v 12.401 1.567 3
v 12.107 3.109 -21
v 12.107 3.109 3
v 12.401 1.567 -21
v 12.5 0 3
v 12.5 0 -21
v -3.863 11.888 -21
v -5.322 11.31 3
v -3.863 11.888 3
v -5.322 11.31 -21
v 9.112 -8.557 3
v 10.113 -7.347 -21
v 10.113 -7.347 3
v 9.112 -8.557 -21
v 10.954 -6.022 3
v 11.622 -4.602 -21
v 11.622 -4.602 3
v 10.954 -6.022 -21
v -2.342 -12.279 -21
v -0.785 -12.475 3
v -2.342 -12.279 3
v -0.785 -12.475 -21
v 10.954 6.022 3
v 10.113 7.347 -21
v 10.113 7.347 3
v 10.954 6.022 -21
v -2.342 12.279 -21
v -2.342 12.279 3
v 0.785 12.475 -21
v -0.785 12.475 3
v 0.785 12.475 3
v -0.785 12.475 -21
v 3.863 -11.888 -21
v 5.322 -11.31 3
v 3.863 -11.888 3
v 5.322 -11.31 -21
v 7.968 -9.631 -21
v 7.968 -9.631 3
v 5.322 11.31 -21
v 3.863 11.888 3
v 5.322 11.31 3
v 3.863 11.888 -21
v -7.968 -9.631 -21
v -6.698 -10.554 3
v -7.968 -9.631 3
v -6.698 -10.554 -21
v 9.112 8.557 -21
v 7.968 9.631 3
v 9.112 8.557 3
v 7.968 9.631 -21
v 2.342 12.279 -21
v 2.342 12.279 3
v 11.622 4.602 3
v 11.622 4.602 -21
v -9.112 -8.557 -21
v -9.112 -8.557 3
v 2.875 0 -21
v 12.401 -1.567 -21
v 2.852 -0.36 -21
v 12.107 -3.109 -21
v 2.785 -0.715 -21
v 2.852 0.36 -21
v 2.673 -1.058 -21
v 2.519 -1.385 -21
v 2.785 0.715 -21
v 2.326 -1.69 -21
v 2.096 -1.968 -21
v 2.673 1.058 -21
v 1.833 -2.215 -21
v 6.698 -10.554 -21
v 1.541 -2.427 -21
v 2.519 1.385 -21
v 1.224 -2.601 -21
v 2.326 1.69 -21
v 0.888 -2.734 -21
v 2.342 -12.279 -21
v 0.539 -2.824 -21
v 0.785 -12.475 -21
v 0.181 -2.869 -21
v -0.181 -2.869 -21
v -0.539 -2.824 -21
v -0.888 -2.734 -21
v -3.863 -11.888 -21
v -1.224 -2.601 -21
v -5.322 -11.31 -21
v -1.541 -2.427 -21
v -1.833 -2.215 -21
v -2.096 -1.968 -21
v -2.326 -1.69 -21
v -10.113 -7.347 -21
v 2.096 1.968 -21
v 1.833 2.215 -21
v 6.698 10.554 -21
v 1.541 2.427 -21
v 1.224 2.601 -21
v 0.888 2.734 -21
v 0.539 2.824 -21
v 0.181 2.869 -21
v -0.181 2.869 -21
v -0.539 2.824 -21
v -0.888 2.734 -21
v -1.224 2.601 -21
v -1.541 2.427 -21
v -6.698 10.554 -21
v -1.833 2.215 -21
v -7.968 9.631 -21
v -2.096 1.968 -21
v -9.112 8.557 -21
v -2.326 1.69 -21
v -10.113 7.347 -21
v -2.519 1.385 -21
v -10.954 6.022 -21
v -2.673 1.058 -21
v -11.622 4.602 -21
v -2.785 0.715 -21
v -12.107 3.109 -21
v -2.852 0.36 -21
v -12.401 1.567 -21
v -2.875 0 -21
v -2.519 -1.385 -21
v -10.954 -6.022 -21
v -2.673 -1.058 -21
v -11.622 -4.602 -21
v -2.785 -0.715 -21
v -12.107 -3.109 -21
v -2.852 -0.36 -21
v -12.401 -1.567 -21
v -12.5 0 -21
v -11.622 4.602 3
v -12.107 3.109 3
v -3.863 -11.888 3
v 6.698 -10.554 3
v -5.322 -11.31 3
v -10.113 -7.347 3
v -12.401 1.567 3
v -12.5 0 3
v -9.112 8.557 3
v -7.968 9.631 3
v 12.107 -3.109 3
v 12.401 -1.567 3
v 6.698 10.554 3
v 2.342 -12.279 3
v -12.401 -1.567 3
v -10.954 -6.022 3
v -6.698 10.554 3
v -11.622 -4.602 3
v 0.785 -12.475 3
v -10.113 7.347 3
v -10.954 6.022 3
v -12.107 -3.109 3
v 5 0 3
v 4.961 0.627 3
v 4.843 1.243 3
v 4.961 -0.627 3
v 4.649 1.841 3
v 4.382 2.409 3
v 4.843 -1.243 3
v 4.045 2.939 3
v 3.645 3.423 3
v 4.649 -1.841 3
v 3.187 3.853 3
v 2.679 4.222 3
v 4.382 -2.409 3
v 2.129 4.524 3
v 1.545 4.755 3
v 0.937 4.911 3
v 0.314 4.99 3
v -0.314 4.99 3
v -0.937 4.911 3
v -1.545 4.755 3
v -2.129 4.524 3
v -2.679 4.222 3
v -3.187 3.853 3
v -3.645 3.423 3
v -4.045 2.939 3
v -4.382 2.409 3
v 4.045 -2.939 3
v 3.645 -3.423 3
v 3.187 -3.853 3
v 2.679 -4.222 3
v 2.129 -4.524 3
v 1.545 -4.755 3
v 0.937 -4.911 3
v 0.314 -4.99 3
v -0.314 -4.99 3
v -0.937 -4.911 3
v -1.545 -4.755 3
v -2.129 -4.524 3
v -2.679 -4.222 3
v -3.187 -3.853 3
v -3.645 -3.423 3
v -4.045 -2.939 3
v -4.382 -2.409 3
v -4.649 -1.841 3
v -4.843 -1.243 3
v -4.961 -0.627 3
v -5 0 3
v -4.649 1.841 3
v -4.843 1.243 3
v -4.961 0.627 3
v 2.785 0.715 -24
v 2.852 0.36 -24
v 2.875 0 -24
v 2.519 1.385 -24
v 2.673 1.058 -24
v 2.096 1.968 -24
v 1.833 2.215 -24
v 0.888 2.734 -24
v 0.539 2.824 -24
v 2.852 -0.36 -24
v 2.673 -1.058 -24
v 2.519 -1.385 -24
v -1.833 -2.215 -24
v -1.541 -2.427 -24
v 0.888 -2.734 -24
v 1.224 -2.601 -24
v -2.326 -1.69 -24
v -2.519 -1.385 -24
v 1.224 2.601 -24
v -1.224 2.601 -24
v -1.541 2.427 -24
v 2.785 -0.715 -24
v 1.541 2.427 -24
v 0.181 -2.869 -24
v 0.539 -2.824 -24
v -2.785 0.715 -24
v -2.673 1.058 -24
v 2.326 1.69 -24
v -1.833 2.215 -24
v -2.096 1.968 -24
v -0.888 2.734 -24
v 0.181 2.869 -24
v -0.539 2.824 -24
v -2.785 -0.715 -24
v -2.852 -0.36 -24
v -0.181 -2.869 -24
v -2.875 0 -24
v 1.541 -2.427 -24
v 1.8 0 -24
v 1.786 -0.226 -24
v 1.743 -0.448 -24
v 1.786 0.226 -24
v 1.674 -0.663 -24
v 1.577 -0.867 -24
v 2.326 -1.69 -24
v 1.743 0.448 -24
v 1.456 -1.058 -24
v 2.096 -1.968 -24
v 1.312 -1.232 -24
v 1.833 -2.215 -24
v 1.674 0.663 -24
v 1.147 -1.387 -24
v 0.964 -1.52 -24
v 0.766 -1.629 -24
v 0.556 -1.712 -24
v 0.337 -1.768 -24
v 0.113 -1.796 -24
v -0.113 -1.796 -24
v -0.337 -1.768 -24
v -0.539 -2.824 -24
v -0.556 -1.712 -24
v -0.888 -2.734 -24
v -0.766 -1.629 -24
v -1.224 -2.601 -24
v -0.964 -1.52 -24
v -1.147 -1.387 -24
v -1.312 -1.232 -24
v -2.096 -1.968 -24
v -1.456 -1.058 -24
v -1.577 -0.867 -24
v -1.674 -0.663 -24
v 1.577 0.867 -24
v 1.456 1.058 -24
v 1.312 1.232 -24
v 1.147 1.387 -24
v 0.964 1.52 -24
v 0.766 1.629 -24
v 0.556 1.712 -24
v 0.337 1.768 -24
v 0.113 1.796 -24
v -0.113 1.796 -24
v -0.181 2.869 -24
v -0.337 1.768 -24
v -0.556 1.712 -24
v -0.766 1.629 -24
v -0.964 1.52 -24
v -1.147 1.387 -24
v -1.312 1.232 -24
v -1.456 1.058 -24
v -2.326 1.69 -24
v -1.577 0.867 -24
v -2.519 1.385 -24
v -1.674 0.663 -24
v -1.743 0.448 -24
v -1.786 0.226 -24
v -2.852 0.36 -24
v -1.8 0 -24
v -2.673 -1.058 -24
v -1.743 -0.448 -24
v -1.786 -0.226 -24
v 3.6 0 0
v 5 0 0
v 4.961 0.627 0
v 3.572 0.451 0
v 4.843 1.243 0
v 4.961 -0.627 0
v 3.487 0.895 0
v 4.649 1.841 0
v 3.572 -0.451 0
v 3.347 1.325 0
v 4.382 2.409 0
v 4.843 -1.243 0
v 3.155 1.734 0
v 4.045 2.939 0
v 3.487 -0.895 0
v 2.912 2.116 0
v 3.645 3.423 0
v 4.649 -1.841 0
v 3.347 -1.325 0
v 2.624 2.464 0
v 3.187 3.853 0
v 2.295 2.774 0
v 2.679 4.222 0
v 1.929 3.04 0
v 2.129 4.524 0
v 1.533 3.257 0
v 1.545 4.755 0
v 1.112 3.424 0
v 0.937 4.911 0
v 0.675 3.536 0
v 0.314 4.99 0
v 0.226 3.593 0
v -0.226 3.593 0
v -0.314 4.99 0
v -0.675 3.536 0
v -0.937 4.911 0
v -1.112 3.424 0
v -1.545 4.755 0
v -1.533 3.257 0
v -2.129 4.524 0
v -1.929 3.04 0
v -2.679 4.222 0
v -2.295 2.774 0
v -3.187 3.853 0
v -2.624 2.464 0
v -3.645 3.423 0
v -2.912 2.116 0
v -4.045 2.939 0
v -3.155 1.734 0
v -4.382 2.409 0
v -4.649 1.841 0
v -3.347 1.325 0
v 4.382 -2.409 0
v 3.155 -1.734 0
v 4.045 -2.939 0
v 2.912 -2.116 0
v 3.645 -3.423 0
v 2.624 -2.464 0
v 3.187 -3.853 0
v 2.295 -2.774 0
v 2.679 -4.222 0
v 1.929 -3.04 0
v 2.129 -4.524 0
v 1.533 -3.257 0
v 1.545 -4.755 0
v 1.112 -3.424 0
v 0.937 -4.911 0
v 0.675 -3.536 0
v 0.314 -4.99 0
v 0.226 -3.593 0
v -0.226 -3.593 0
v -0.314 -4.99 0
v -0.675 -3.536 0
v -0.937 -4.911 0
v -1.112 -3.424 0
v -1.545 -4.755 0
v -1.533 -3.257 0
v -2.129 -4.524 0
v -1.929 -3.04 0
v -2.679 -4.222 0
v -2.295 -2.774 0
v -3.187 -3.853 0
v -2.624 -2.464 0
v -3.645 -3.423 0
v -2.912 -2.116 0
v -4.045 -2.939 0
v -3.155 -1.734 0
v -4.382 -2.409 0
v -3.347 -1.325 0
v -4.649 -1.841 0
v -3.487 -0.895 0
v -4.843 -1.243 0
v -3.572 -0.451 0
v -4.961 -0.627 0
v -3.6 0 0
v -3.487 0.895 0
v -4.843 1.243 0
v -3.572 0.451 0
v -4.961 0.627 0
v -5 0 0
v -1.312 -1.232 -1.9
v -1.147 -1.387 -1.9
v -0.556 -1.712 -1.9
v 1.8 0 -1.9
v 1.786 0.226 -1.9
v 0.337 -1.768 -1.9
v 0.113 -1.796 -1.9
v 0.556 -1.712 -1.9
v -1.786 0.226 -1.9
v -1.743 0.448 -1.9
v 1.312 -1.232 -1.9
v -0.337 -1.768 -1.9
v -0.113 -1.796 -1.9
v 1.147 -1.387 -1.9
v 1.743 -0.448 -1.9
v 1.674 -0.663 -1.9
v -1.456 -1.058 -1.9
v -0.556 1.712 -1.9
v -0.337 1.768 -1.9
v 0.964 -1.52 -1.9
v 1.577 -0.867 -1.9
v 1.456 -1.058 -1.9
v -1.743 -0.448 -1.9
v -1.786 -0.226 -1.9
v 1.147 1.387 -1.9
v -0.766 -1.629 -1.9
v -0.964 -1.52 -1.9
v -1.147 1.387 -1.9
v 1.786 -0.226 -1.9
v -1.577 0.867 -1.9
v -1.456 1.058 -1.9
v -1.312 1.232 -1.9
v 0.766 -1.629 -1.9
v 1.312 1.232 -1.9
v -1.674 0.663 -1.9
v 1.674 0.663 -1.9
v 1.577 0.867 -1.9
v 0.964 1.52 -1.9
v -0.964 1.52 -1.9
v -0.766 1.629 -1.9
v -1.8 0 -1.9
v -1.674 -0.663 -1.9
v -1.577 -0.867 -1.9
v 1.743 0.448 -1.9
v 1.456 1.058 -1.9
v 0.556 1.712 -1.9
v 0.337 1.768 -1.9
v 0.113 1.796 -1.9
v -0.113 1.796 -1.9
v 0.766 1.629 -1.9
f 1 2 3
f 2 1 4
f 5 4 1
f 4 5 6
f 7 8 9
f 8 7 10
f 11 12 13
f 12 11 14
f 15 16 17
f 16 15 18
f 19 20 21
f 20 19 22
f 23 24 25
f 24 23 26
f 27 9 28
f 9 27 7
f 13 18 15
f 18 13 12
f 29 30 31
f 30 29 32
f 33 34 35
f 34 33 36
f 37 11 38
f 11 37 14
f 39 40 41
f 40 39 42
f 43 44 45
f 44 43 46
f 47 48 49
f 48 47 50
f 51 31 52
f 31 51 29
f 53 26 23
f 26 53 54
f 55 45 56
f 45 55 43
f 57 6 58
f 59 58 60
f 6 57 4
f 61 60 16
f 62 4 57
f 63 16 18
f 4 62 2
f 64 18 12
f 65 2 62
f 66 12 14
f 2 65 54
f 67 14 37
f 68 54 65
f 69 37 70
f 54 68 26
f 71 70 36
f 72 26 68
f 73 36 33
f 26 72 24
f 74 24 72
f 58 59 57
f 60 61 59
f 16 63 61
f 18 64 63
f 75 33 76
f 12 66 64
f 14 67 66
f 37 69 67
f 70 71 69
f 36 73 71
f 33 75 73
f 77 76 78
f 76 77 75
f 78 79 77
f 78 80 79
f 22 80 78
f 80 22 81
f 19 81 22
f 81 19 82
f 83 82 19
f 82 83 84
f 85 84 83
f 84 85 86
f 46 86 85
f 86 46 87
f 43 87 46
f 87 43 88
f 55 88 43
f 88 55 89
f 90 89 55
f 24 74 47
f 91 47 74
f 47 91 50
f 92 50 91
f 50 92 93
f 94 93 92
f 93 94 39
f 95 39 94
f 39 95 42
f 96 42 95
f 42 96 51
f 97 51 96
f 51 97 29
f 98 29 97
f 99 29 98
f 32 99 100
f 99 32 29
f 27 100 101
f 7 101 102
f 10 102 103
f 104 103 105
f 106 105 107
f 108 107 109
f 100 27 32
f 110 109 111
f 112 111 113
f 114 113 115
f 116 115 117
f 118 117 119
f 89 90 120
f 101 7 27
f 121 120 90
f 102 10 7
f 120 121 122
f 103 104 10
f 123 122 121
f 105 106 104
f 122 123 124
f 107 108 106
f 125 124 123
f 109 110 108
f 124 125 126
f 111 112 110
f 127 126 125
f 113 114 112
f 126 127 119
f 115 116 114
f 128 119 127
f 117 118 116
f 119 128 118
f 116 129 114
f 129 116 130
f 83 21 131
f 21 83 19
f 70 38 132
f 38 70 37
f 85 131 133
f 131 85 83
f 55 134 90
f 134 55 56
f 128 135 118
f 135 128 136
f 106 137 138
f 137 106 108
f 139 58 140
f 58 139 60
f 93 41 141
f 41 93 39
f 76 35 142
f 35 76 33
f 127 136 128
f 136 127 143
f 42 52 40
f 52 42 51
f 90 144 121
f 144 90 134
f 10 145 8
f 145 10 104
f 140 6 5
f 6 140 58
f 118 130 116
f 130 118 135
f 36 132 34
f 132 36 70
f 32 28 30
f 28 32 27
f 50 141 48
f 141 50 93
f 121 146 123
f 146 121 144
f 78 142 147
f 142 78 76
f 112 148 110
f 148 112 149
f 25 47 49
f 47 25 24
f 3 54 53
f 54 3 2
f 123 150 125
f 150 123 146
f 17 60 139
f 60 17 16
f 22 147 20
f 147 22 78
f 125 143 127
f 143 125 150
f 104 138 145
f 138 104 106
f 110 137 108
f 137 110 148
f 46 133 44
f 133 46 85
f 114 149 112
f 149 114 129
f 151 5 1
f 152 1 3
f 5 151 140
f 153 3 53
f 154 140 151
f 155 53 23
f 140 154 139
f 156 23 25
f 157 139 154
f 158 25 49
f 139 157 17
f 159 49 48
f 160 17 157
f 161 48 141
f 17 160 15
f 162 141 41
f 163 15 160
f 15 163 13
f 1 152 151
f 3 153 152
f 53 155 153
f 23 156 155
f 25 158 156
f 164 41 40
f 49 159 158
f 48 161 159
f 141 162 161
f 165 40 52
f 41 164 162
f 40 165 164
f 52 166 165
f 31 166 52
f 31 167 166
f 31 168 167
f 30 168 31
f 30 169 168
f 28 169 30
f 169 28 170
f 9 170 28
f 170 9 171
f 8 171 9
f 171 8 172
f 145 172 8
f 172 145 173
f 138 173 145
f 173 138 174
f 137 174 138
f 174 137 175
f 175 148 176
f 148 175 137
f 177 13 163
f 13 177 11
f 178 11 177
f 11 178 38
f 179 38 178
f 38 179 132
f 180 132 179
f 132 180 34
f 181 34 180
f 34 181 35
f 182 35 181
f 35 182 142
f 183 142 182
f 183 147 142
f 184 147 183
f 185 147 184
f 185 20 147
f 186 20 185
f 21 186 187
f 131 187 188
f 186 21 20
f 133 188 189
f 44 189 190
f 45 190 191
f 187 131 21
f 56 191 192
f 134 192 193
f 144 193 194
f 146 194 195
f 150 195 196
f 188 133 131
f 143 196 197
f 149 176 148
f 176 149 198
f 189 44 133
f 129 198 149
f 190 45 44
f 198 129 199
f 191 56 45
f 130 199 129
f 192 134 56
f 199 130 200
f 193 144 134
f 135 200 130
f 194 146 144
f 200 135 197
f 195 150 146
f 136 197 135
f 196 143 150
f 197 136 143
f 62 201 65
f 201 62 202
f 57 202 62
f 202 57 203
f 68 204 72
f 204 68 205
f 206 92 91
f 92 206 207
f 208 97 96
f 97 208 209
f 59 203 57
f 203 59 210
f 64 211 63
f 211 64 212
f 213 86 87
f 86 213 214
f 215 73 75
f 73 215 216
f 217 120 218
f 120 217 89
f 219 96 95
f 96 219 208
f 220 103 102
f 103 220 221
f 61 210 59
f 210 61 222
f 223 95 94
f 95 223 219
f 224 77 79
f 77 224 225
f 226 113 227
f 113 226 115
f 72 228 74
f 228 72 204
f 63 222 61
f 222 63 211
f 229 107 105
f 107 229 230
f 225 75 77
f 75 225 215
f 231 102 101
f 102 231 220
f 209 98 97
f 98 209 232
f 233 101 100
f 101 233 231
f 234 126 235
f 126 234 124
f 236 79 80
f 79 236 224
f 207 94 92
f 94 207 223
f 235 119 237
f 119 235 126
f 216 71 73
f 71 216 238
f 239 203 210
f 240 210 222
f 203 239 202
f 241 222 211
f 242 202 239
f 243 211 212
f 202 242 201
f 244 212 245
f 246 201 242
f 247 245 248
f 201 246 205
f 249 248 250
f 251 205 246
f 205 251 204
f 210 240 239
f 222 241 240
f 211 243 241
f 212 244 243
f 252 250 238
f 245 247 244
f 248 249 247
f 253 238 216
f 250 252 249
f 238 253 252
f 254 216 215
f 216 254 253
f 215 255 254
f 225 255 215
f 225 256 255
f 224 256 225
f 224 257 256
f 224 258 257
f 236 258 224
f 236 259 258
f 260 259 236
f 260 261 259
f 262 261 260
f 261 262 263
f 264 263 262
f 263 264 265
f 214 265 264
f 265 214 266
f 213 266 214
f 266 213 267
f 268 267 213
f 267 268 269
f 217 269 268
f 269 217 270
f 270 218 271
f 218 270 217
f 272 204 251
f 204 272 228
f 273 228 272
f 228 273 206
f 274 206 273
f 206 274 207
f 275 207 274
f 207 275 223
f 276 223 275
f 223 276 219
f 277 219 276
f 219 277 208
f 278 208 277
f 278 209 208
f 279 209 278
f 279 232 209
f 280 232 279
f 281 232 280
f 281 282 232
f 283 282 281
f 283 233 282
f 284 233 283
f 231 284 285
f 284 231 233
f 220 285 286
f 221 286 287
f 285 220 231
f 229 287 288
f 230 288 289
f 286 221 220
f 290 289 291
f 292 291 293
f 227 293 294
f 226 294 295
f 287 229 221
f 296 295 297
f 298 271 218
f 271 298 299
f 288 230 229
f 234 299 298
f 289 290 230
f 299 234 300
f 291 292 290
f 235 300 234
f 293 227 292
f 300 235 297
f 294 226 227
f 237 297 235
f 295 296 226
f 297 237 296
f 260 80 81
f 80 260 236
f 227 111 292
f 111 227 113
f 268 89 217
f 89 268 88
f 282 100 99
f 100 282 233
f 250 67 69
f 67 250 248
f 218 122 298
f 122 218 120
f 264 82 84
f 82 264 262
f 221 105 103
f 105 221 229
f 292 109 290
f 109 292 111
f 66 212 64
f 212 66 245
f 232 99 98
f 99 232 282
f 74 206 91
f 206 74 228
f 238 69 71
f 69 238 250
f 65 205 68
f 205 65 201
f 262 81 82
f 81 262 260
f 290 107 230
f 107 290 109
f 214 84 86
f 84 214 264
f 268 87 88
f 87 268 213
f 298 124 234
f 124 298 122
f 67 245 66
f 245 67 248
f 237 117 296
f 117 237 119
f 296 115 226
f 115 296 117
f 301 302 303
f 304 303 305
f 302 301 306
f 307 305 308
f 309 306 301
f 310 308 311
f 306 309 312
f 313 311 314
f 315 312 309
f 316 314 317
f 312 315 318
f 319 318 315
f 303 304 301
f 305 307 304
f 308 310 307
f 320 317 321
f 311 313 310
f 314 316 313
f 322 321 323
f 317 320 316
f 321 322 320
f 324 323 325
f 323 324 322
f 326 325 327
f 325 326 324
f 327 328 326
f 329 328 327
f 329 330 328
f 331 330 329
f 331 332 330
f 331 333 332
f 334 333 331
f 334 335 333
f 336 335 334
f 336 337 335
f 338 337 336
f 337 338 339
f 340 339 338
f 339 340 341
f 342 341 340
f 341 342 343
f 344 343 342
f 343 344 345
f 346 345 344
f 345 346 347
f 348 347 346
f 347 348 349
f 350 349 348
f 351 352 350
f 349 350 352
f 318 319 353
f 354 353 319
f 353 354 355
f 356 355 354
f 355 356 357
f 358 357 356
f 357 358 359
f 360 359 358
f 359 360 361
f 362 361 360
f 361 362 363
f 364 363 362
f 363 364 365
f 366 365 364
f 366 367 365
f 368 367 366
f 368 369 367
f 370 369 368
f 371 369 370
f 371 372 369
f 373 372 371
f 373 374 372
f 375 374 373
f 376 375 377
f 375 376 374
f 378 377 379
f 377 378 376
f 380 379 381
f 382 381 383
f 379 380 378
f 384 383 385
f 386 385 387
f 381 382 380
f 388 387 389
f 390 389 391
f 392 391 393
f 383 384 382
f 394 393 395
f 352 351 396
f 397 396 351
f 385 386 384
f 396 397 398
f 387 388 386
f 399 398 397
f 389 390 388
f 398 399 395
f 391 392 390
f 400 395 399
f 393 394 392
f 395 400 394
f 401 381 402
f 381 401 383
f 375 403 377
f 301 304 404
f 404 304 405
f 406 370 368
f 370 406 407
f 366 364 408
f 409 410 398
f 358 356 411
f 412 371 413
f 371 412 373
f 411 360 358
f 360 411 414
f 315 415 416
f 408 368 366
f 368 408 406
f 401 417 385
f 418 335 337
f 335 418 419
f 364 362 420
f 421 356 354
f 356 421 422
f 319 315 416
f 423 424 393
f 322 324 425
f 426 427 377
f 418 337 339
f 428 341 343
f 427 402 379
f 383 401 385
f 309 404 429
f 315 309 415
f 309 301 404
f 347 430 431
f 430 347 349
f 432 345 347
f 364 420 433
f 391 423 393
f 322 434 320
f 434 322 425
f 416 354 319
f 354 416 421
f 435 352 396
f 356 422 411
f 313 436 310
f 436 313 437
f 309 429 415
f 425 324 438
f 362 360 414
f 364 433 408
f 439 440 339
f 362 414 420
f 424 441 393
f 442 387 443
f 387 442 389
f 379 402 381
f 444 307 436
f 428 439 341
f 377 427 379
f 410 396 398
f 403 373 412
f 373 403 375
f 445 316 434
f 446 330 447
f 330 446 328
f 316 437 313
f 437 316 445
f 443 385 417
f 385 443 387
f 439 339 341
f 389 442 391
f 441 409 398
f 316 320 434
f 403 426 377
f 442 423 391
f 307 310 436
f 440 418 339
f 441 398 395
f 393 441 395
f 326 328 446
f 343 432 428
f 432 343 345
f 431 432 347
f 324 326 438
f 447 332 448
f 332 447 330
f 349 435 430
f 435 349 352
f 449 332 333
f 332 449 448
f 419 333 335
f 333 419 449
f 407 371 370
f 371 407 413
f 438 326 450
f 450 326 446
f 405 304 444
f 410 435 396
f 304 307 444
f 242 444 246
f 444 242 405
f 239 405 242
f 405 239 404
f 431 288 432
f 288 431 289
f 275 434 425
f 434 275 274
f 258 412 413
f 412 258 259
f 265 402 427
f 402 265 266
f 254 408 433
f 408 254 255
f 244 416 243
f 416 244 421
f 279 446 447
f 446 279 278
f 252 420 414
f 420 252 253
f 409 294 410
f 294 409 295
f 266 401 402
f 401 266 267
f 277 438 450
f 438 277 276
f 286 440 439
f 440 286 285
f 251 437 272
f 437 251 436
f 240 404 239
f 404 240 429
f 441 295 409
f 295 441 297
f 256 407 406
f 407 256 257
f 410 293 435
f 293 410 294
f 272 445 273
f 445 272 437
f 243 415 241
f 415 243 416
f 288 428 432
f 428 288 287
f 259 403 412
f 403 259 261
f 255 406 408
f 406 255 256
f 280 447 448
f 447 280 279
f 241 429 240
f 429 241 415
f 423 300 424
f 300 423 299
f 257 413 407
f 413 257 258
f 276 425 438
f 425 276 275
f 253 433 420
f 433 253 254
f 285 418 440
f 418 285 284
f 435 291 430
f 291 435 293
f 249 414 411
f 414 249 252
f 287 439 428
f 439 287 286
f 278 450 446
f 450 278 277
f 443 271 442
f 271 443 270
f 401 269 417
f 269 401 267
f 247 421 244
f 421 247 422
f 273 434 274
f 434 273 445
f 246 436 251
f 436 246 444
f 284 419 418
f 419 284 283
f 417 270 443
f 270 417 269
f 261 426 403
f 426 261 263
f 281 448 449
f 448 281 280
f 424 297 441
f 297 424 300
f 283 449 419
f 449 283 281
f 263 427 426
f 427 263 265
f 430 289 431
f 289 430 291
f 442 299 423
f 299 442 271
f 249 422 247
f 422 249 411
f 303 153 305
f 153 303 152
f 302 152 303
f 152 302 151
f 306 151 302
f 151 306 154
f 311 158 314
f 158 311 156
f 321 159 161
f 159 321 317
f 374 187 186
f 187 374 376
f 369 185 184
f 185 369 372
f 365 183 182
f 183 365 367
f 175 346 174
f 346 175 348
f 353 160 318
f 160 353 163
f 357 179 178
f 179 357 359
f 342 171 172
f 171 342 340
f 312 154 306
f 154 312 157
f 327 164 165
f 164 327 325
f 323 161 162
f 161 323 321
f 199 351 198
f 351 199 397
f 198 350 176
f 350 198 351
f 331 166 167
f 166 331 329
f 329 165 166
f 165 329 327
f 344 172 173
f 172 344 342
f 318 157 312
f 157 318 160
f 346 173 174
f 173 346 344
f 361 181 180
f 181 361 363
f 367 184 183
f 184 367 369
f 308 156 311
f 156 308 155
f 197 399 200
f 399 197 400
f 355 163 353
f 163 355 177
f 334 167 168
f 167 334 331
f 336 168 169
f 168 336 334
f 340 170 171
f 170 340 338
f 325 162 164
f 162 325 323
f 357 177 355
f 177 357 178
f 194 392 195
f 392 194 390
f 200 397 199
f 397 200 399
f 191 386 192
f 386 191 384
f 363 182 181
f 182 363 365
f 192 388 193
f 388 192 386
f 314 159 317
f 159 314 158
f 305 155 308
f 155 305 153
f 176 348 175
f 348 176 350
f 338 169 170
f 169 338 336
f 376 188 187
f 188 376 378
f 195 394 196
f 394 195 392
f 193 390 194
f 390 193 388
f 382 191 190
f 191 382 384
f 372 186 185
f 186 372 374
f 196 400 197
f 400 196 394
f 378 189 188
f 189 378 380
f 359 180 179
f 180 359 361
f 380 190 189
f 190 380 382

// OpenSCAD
$fn = 50;

difference() {
	union() {
		translate(v = [0, 0, -21.0]) {
			cylinder(h = 24, r = 12.5);
		}
		#translate(v = [0, 0, -24.0]) {
			cylinder(h = 24, r = 2.875);
		}
	}
	union() {
		translate(v = [0, 0, 0]) {
			rotate(a = [0, 0, 0]) {
				difference() {
					union() {
						translate(v = [0, 0, -24.0]) {
							cylinder(h = 24, r = 1.5);
						}
						translate(v = [0, 0, -1.9]) {
							cylinder(h = 1.9, r1 = 1.8, r2 = 3.6);
						}
						translate(v = [0, 0, -24.0]) {
							cylinder(h = 24, r = 1.8);
						}
						translate(v = [0, 0, -24.0]) {
							cylinder(h = 24, r = 1.5);
						}
					}
					union();
				}
			}
		}
		#cylinder(h = 3, r = 5.0);
	}
}
